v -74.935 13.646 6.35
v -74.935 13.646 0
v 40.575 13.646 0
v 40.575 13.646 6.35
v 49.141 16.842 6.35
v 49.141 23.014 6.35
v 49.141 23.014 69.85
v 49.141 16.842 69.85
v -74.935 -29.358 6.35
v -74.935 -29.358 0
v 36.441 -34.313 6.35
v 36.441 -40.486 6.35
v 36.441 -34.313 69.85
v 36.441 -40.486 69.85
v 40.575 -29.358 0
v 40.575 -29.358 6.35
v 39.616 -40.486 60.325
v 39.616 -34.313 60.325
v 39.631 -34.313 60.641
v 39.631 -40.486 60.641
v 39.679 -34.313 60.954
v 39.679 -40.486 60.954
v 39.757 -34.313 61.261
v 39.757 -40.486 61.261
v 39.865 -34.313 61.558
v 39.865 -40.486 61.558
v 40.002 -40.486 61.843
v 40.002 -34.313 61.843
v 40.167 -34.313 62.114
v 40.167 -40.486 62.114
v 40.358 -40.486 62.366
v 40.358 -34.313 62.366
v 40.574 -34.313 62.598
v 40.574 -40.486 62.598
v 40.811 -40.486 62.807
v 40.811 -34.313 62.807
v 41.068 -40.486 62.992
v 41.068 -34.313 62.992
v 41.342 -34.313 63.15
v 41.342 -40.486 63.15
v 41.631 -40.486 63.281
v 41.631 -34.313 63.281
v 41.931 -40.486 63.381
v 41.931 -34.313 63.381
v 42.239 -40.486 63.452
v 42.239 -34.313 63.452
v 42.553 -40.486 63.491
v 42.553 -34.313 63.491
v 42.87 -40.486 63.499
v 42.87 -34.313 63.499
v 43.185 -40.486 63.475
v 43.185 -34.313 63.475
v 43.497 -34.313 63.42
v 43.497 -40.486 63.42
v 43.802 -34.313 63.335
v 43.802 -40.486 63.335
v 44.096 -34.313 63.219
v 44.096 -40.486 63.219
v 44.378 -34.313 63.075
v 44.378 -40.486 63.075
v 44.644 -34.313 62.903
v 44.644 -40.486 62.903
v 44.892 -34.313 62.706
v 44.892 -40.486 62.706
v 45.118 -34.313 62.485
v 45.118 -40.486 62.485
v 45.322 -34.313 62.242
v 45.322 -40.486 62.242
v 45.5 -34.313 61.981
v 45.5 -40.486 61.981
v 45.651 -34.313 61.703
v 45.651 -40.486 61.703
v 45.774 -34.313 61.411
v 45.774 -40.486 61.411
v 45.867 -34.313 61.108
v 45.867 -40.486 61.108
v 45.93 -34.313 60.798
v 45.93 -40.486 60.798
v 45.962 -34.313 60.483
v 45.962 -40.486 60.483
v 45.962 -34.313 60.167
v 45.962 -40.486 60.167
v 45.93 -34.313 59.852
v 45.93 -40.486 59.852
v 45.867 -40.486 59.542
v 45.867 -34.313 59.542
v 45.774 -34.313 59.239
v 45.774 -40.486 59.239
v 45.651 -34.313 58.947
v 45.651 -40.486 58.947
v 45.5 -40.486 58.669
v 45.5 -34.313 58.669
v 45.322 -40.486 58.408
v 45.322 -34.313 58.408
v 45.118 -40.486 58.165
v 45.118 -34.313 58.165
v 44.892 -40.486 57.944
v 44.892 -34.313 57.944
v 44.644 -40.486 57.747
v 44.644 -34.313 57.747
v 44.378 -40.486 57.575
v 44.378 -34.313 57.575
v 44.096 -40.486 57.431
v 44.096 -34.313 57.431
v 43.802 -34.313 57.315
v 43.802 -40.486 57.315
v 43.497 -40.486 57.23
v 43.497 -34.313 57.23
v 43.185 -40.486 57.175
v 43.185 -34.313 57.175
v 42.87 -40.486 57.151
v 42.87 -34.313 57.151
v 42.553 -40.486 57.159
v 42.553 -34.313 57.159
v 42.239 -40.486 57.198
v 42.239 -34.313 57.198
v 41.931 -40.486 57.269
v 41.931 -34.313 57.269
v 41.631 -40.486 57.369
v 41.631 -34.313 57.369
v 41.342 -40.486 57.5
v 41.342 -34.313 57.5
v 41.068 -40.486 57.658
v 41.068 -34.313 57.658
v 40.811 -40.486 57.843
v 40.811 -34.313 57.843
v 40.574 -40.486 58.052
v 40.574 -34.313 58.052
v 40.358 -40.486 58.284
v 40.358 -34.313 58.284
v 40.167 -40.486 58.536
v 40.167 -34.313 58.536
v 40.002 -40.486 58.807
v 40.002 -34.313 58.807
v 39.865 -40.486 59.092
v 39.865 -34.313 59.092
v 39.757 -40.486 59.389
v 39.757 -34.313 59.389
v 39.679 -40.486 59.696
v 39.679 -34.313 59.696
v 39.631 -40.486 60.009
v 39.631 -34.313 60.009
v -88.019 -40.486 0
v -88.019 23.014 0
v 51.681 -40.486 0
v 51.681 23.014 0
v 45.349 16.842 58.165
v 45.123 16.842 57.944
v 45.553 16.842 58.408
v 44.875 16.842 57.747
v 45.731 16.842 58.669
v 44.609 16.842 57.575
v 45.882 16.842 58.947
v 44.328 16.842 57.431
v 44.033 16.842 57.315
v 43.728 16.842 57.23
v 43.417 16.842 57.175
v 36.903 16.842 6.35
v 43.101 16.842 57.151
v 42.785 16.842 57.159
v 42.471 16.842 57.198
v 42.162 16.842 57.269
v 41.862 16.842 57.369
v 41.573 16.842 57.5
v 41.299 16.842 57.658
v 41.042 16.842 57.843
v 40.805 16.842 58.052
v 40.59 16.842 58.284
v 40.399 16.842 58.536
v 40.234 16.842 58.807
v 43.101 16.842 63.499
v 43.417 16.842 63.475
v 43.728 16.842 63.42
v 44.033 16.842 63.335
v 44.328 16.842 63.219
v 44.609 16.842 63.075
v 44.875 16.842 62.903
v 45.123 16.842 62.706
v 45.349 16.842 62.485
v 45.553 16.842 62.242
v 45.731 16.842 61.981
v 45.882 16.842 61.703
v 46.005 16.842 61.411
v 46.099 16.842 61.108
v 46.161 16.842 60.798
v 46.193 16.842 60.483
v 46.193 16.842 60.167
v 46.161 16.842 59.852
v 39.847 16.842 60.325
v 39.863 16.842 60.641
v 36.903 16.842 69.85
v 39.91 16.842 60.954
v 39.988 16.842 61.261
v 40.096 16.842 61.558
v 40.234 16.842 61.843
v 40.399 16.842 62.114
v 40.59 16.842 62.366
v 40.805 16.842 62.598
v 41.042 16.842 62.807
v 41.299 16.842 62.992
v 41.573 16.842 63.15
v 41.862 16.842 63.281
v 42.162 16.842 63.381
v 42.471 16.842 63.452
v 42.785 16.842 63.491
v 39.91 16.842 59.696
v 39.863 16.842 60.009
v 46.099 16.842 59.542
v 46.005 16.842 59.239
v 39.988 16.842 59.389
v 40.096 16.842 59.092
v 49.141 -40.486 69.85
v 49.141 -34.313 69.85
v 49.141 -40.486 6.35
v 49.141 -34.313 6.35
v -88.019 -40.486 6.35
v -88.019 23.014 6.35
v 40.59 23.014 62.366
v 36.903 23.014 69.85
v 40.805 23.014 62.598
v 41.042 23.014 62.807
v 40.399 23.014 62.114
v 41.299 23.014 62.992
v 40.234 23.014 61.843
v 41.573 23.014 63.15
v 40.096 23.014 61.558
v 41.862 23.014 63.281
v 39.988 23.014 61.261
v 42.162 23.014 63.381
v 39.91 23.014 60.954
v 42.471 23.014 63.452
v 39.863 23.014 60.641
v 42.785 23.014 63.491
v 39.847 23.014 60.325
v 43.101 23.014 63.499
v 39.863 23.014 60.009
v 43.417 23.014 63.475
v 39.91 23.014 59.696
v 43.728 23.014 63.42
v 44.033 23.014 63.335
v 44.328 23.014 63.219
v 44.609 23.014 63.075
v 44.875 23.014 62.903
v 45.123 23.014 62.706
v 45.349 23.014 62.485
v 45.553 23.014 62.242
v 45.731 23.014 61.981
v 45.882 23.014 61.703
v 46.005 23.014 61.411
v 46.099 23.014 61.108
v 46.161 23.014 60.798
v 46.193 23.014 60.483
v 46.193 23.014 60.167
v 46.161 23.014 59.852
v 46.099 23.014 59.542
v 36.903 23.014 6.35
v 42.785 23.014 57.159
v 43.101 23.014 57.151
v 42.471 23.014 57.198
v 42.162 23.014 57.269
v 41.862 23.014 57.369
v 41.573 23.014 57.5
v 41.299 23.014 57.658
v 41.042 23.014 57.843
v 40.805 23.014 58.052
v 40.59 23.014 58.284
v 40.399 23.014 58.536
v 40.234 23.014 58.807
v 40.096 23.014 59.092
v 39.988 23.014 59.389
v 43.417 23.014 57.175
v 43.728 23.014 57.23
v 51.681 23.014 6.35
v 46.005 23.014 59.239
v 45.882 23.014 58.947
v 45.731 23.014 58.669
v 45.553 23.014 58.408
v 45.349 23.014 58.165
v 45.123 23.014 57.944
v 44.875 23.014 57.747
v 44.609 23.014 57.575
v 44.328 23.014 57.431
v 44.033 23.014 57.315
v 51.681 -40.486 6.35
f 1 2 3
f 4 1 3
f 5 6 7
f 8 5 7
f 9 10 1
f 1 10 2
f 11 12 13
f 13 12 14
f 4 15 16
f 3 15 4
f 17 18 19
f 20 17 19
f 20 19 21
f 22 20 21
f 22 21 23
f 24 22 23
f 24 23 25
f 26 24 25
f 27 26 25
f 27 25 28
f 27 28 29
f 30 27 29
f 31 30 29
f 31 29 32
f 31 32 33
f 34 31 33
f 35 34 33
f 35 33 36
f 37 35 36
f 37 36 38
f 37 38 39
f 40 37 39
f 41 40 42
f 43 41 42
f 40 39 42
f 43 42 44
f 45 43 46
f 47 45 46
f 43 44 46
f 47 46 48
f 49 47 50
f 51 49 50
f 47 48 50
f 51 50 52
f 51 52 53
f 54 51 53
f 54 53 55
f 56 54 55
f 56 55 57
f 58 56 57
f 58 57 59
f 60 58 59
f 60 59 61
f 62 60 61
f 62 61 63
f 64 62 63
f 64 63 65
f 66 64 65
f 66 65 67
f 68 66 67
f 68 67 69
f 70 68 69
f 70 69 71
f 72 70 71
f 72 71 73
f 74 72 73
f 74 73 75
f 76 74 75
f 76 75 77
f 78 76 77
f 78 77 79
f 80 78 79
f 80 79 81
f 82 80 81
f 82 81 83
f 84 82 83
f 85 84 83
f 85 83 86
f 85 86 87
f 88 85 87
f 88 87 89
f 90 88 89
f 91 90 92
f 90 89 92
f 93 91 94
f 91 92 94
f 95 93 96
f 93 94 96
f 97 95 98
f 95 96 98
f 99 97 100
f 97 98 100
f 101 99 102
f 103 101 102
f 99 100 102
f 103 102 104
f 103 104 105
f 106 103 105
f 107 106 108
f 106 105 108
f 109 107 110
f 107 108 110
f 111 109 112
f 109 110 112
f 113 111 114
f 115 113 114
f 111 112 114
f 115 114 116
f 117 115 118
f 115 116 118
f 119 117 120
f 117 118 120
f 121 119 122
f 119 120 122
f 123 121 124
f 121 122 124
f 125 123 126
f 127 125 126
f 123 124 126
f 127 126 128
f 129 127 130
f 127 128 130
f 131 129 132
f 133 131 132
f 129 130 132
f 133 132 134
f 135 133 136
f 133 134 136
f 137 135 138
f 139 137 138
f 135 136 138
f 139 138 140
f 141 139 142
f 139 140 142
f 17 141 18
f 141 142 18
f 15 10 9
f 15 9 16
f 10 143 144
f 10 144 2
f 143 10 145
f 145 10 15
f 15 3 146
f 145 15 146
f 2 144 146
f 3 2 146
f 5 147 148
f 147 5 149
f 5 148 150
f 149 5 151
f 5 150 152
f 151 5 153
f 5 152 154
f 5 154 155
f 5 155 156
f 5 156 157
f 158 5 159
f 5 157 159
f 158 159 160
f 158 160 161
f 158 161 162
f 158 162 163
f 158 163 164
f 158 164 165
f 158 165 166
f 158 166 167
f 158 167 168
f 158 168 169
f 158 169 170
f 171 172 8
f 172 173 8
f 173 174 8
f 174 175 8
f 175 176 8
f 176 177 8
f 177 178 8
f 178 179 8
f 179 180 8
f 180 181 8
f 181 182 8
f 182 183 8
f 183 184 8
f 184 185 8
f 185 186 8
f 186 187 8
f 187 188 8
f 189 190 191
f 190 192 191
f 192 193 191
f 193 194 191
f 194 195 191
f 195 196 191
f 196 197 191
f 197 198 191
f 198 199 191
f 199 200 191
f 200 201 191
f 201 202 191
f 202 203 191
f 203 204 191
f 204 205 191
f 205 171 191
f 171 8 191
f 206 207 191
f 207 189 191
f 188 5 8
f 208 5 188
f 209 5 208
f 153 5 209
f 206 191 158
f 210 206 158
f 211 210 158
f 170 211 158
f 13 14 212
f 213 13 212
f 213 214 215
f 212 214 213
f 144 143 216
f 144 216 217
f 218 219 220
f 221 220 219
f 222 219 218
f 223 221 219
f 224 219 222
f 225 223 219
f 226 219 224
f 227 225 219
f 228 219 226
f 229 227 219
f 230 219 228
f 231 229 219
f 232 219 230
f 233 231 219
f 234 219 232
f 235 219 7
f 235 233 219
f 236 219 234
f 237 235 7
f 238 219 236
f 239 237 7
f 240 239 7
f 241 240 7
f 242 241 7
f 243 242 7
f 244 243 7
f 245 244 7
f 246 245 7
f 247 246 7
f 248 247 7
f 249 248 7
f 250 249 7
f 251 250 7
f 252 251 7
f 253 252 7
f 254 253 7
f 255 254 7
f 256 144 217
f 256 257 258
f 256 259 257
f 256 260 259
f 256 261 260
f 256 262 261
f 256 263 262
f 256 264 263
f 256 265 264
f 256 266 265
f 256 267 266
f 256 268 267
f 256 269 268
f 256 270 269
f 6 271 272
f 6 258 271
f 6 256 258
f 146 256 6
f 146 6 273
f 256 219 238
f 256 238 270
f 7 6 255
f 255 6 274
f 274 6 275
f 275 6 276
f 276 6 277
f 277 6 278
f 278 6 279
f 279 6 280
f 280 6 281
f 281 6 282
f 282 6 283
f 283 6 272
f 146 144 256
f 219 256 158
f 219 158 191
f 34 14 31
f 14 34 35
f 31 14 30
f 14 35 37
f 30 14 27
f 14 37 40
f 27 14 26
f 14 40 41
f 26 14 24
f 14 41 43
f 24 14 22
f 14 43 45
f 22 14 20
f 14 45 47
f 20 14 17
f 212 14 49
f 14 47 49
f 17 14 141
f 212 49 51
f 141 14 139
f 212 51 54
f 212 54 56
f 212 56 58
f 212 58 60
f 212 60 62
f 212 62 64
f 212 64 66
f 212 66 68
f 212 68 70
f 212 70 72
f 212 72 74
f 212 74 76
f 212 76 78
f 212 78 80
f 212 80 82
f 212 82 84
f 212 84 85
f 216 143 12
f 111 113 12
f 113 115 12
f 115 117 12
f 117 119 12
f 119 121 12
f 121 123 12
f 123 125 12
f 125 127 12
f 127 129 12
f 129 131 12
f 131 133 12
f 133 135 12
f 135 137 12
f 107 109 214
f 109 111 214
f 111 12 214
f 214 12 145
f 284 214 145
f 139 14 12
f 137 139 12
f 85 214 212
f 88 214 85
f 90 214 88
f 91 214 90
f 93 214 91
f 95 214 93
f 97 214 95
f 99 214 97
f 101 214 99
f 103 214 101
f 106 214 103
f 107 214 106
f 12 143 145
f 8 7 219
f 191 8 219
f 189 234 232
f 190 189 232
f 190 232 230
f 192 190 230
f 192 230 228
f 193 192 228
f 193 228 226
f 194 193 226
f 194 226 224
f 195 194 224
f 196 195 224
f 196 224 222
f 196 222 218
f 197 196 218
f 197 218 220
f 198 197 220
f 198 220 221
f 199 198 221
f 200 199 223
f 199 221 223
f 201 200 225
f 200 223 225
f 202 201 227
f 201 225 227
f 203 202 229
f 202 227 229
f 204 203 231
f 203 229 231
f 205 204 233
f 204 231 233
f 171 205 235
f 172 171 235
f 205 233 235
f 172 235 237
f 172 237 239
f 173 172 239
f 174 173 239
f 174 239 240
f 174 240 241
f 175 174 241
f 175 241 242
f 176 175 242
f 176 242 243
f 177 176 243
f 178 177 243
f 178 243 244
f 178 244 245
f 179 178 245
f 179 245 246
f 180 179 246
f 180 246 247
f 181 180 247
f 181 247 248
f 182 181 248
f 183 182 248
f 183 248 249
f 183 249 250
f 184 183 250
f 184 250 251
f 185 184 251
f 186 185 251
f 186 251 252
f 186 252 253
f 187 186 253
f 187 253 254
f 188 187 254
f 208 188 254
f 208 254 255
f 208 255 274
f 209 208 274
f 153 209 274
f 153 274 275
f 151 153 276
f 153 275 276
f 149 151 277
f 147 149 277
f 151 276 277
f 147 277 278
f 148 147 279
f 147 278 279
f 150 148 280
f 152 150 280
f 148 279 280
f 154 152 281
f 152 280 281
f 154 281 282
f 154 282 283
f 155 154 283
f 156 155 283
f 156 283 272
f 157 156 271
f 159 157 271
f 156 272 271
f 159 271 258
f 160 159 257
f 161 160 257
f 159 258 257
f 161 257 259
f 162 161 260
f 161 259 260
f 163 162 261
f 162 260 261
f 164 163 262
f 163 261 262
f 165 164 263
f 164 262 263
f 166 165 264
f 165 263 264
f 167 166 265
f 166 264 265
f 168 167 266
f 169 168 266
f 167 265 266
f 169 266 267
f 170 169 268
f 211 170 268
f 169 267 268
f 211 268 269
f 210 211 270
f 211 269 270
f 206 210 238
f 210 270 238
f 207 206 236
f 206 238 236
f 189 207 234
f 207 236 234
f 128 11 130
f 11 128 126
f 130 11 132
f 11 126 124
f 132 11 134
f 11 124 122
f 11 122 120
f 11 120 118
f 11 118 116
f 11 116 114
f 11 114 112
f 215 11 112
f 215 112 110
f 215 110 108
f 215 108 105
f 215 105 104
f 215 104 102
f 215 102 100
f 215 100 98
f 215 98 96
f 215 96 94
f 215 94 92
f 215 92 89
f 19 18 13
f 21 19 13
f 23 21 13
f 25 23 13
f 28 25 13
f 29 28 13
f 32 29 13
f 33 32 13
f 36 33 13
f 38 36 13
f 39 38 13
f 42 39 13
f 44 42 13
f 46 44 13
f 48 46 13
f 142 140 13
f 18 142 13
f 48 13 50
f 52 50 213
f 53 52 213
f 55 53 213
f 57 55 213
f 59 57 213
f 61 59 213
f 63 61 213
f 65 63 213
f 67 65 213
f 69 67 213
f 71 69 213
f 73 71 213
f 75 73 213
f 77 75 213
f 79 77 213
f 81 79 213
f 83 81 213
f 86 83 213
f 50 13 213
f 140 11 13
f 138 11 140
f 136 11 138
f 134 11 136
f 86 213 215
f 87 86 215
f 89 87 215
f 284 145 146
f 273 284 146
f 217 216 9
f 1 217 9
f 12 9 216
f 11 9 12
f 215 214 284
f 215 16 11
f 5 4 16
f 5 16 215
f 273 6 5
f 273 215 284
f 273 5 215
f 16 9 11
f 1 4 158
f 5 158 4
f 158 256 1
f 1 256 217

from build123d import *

# Parameters (mm, degrees)
F0_W     = 139.7
F0_H     = 63.5
F0_W_2   = 115.509763
F0_H_2   = 43.004075
F1_DEPTH = 6.35
F2_W     = 12.7
F2_H     = 63.5
F3_DEPTH = 6.173076
F4_R     = 3.175
F5_DEPTH = 32.64235
F6_W     = 12.237505
F6_H     = 63.5
F7_DEPTH = 6.1722
F8_R     = 3.175
F9_DEPTH = 25.4


with BuildPart() as f1:
    # F0 (on Top) → F1 (new body)
    with BuildSketch(Plane.XY):
        with Locations((-18.169344, -8.735743)):
            Rectangle(F0_W, F0_H)
        with Locations((-17.179944, -7.856222)):
            Rectangle(F0_W_2, F0_H_2, mode=Mode.SUBTRACT)
    extrude(amount=F1_DEPTH)

    # F2 (on face) → F3 (join)
    with BuildSketch(Plane.XZ.offset(40.485743)):
        with Locations((42.790656, 38.1)):
            Rectangle(F2_W, F2_H)
    extrude(amount=-F3_DEPTH)

    # F4 (on face) → F5 (cut)
    with BuildSketch(Plane(origin=(0, -34.312667, 0), x_dir=(-1, 0, 0), z_dir=(0, 1, 0))):
        with Locations((-42.790656, 60.325)):
            Circle(F4_R)
    extrude(amount=-F5_DEPTH, mode=Mode.SUBTRACT)

    # F6 (on face) → F7 (join)
    with BuildSketch(Plane(origin=(0, 23.014257, 0), x_dir=(-1, 0, 0), z_dir=(0, 1, 0))):
        with Locations((-43.021904, 38.1)):
            Rectangle(F6_W, F6_H)
    extrude(amount=-F7_DEPTH)

    # F8 (on face) → F9 (cut)
    with BuildSketch(Plane(origin=(0, 23.014257, 0), x_dir=(-1, 0, 0), z_dir=(0, 1, 0))):
        with Locations((-43.021903, 60.325)):
            Circle(F8_R)
    extrude(amount=-F9_DEPTH, mode=Mode.SUBTRACT)


solid = f1.part
